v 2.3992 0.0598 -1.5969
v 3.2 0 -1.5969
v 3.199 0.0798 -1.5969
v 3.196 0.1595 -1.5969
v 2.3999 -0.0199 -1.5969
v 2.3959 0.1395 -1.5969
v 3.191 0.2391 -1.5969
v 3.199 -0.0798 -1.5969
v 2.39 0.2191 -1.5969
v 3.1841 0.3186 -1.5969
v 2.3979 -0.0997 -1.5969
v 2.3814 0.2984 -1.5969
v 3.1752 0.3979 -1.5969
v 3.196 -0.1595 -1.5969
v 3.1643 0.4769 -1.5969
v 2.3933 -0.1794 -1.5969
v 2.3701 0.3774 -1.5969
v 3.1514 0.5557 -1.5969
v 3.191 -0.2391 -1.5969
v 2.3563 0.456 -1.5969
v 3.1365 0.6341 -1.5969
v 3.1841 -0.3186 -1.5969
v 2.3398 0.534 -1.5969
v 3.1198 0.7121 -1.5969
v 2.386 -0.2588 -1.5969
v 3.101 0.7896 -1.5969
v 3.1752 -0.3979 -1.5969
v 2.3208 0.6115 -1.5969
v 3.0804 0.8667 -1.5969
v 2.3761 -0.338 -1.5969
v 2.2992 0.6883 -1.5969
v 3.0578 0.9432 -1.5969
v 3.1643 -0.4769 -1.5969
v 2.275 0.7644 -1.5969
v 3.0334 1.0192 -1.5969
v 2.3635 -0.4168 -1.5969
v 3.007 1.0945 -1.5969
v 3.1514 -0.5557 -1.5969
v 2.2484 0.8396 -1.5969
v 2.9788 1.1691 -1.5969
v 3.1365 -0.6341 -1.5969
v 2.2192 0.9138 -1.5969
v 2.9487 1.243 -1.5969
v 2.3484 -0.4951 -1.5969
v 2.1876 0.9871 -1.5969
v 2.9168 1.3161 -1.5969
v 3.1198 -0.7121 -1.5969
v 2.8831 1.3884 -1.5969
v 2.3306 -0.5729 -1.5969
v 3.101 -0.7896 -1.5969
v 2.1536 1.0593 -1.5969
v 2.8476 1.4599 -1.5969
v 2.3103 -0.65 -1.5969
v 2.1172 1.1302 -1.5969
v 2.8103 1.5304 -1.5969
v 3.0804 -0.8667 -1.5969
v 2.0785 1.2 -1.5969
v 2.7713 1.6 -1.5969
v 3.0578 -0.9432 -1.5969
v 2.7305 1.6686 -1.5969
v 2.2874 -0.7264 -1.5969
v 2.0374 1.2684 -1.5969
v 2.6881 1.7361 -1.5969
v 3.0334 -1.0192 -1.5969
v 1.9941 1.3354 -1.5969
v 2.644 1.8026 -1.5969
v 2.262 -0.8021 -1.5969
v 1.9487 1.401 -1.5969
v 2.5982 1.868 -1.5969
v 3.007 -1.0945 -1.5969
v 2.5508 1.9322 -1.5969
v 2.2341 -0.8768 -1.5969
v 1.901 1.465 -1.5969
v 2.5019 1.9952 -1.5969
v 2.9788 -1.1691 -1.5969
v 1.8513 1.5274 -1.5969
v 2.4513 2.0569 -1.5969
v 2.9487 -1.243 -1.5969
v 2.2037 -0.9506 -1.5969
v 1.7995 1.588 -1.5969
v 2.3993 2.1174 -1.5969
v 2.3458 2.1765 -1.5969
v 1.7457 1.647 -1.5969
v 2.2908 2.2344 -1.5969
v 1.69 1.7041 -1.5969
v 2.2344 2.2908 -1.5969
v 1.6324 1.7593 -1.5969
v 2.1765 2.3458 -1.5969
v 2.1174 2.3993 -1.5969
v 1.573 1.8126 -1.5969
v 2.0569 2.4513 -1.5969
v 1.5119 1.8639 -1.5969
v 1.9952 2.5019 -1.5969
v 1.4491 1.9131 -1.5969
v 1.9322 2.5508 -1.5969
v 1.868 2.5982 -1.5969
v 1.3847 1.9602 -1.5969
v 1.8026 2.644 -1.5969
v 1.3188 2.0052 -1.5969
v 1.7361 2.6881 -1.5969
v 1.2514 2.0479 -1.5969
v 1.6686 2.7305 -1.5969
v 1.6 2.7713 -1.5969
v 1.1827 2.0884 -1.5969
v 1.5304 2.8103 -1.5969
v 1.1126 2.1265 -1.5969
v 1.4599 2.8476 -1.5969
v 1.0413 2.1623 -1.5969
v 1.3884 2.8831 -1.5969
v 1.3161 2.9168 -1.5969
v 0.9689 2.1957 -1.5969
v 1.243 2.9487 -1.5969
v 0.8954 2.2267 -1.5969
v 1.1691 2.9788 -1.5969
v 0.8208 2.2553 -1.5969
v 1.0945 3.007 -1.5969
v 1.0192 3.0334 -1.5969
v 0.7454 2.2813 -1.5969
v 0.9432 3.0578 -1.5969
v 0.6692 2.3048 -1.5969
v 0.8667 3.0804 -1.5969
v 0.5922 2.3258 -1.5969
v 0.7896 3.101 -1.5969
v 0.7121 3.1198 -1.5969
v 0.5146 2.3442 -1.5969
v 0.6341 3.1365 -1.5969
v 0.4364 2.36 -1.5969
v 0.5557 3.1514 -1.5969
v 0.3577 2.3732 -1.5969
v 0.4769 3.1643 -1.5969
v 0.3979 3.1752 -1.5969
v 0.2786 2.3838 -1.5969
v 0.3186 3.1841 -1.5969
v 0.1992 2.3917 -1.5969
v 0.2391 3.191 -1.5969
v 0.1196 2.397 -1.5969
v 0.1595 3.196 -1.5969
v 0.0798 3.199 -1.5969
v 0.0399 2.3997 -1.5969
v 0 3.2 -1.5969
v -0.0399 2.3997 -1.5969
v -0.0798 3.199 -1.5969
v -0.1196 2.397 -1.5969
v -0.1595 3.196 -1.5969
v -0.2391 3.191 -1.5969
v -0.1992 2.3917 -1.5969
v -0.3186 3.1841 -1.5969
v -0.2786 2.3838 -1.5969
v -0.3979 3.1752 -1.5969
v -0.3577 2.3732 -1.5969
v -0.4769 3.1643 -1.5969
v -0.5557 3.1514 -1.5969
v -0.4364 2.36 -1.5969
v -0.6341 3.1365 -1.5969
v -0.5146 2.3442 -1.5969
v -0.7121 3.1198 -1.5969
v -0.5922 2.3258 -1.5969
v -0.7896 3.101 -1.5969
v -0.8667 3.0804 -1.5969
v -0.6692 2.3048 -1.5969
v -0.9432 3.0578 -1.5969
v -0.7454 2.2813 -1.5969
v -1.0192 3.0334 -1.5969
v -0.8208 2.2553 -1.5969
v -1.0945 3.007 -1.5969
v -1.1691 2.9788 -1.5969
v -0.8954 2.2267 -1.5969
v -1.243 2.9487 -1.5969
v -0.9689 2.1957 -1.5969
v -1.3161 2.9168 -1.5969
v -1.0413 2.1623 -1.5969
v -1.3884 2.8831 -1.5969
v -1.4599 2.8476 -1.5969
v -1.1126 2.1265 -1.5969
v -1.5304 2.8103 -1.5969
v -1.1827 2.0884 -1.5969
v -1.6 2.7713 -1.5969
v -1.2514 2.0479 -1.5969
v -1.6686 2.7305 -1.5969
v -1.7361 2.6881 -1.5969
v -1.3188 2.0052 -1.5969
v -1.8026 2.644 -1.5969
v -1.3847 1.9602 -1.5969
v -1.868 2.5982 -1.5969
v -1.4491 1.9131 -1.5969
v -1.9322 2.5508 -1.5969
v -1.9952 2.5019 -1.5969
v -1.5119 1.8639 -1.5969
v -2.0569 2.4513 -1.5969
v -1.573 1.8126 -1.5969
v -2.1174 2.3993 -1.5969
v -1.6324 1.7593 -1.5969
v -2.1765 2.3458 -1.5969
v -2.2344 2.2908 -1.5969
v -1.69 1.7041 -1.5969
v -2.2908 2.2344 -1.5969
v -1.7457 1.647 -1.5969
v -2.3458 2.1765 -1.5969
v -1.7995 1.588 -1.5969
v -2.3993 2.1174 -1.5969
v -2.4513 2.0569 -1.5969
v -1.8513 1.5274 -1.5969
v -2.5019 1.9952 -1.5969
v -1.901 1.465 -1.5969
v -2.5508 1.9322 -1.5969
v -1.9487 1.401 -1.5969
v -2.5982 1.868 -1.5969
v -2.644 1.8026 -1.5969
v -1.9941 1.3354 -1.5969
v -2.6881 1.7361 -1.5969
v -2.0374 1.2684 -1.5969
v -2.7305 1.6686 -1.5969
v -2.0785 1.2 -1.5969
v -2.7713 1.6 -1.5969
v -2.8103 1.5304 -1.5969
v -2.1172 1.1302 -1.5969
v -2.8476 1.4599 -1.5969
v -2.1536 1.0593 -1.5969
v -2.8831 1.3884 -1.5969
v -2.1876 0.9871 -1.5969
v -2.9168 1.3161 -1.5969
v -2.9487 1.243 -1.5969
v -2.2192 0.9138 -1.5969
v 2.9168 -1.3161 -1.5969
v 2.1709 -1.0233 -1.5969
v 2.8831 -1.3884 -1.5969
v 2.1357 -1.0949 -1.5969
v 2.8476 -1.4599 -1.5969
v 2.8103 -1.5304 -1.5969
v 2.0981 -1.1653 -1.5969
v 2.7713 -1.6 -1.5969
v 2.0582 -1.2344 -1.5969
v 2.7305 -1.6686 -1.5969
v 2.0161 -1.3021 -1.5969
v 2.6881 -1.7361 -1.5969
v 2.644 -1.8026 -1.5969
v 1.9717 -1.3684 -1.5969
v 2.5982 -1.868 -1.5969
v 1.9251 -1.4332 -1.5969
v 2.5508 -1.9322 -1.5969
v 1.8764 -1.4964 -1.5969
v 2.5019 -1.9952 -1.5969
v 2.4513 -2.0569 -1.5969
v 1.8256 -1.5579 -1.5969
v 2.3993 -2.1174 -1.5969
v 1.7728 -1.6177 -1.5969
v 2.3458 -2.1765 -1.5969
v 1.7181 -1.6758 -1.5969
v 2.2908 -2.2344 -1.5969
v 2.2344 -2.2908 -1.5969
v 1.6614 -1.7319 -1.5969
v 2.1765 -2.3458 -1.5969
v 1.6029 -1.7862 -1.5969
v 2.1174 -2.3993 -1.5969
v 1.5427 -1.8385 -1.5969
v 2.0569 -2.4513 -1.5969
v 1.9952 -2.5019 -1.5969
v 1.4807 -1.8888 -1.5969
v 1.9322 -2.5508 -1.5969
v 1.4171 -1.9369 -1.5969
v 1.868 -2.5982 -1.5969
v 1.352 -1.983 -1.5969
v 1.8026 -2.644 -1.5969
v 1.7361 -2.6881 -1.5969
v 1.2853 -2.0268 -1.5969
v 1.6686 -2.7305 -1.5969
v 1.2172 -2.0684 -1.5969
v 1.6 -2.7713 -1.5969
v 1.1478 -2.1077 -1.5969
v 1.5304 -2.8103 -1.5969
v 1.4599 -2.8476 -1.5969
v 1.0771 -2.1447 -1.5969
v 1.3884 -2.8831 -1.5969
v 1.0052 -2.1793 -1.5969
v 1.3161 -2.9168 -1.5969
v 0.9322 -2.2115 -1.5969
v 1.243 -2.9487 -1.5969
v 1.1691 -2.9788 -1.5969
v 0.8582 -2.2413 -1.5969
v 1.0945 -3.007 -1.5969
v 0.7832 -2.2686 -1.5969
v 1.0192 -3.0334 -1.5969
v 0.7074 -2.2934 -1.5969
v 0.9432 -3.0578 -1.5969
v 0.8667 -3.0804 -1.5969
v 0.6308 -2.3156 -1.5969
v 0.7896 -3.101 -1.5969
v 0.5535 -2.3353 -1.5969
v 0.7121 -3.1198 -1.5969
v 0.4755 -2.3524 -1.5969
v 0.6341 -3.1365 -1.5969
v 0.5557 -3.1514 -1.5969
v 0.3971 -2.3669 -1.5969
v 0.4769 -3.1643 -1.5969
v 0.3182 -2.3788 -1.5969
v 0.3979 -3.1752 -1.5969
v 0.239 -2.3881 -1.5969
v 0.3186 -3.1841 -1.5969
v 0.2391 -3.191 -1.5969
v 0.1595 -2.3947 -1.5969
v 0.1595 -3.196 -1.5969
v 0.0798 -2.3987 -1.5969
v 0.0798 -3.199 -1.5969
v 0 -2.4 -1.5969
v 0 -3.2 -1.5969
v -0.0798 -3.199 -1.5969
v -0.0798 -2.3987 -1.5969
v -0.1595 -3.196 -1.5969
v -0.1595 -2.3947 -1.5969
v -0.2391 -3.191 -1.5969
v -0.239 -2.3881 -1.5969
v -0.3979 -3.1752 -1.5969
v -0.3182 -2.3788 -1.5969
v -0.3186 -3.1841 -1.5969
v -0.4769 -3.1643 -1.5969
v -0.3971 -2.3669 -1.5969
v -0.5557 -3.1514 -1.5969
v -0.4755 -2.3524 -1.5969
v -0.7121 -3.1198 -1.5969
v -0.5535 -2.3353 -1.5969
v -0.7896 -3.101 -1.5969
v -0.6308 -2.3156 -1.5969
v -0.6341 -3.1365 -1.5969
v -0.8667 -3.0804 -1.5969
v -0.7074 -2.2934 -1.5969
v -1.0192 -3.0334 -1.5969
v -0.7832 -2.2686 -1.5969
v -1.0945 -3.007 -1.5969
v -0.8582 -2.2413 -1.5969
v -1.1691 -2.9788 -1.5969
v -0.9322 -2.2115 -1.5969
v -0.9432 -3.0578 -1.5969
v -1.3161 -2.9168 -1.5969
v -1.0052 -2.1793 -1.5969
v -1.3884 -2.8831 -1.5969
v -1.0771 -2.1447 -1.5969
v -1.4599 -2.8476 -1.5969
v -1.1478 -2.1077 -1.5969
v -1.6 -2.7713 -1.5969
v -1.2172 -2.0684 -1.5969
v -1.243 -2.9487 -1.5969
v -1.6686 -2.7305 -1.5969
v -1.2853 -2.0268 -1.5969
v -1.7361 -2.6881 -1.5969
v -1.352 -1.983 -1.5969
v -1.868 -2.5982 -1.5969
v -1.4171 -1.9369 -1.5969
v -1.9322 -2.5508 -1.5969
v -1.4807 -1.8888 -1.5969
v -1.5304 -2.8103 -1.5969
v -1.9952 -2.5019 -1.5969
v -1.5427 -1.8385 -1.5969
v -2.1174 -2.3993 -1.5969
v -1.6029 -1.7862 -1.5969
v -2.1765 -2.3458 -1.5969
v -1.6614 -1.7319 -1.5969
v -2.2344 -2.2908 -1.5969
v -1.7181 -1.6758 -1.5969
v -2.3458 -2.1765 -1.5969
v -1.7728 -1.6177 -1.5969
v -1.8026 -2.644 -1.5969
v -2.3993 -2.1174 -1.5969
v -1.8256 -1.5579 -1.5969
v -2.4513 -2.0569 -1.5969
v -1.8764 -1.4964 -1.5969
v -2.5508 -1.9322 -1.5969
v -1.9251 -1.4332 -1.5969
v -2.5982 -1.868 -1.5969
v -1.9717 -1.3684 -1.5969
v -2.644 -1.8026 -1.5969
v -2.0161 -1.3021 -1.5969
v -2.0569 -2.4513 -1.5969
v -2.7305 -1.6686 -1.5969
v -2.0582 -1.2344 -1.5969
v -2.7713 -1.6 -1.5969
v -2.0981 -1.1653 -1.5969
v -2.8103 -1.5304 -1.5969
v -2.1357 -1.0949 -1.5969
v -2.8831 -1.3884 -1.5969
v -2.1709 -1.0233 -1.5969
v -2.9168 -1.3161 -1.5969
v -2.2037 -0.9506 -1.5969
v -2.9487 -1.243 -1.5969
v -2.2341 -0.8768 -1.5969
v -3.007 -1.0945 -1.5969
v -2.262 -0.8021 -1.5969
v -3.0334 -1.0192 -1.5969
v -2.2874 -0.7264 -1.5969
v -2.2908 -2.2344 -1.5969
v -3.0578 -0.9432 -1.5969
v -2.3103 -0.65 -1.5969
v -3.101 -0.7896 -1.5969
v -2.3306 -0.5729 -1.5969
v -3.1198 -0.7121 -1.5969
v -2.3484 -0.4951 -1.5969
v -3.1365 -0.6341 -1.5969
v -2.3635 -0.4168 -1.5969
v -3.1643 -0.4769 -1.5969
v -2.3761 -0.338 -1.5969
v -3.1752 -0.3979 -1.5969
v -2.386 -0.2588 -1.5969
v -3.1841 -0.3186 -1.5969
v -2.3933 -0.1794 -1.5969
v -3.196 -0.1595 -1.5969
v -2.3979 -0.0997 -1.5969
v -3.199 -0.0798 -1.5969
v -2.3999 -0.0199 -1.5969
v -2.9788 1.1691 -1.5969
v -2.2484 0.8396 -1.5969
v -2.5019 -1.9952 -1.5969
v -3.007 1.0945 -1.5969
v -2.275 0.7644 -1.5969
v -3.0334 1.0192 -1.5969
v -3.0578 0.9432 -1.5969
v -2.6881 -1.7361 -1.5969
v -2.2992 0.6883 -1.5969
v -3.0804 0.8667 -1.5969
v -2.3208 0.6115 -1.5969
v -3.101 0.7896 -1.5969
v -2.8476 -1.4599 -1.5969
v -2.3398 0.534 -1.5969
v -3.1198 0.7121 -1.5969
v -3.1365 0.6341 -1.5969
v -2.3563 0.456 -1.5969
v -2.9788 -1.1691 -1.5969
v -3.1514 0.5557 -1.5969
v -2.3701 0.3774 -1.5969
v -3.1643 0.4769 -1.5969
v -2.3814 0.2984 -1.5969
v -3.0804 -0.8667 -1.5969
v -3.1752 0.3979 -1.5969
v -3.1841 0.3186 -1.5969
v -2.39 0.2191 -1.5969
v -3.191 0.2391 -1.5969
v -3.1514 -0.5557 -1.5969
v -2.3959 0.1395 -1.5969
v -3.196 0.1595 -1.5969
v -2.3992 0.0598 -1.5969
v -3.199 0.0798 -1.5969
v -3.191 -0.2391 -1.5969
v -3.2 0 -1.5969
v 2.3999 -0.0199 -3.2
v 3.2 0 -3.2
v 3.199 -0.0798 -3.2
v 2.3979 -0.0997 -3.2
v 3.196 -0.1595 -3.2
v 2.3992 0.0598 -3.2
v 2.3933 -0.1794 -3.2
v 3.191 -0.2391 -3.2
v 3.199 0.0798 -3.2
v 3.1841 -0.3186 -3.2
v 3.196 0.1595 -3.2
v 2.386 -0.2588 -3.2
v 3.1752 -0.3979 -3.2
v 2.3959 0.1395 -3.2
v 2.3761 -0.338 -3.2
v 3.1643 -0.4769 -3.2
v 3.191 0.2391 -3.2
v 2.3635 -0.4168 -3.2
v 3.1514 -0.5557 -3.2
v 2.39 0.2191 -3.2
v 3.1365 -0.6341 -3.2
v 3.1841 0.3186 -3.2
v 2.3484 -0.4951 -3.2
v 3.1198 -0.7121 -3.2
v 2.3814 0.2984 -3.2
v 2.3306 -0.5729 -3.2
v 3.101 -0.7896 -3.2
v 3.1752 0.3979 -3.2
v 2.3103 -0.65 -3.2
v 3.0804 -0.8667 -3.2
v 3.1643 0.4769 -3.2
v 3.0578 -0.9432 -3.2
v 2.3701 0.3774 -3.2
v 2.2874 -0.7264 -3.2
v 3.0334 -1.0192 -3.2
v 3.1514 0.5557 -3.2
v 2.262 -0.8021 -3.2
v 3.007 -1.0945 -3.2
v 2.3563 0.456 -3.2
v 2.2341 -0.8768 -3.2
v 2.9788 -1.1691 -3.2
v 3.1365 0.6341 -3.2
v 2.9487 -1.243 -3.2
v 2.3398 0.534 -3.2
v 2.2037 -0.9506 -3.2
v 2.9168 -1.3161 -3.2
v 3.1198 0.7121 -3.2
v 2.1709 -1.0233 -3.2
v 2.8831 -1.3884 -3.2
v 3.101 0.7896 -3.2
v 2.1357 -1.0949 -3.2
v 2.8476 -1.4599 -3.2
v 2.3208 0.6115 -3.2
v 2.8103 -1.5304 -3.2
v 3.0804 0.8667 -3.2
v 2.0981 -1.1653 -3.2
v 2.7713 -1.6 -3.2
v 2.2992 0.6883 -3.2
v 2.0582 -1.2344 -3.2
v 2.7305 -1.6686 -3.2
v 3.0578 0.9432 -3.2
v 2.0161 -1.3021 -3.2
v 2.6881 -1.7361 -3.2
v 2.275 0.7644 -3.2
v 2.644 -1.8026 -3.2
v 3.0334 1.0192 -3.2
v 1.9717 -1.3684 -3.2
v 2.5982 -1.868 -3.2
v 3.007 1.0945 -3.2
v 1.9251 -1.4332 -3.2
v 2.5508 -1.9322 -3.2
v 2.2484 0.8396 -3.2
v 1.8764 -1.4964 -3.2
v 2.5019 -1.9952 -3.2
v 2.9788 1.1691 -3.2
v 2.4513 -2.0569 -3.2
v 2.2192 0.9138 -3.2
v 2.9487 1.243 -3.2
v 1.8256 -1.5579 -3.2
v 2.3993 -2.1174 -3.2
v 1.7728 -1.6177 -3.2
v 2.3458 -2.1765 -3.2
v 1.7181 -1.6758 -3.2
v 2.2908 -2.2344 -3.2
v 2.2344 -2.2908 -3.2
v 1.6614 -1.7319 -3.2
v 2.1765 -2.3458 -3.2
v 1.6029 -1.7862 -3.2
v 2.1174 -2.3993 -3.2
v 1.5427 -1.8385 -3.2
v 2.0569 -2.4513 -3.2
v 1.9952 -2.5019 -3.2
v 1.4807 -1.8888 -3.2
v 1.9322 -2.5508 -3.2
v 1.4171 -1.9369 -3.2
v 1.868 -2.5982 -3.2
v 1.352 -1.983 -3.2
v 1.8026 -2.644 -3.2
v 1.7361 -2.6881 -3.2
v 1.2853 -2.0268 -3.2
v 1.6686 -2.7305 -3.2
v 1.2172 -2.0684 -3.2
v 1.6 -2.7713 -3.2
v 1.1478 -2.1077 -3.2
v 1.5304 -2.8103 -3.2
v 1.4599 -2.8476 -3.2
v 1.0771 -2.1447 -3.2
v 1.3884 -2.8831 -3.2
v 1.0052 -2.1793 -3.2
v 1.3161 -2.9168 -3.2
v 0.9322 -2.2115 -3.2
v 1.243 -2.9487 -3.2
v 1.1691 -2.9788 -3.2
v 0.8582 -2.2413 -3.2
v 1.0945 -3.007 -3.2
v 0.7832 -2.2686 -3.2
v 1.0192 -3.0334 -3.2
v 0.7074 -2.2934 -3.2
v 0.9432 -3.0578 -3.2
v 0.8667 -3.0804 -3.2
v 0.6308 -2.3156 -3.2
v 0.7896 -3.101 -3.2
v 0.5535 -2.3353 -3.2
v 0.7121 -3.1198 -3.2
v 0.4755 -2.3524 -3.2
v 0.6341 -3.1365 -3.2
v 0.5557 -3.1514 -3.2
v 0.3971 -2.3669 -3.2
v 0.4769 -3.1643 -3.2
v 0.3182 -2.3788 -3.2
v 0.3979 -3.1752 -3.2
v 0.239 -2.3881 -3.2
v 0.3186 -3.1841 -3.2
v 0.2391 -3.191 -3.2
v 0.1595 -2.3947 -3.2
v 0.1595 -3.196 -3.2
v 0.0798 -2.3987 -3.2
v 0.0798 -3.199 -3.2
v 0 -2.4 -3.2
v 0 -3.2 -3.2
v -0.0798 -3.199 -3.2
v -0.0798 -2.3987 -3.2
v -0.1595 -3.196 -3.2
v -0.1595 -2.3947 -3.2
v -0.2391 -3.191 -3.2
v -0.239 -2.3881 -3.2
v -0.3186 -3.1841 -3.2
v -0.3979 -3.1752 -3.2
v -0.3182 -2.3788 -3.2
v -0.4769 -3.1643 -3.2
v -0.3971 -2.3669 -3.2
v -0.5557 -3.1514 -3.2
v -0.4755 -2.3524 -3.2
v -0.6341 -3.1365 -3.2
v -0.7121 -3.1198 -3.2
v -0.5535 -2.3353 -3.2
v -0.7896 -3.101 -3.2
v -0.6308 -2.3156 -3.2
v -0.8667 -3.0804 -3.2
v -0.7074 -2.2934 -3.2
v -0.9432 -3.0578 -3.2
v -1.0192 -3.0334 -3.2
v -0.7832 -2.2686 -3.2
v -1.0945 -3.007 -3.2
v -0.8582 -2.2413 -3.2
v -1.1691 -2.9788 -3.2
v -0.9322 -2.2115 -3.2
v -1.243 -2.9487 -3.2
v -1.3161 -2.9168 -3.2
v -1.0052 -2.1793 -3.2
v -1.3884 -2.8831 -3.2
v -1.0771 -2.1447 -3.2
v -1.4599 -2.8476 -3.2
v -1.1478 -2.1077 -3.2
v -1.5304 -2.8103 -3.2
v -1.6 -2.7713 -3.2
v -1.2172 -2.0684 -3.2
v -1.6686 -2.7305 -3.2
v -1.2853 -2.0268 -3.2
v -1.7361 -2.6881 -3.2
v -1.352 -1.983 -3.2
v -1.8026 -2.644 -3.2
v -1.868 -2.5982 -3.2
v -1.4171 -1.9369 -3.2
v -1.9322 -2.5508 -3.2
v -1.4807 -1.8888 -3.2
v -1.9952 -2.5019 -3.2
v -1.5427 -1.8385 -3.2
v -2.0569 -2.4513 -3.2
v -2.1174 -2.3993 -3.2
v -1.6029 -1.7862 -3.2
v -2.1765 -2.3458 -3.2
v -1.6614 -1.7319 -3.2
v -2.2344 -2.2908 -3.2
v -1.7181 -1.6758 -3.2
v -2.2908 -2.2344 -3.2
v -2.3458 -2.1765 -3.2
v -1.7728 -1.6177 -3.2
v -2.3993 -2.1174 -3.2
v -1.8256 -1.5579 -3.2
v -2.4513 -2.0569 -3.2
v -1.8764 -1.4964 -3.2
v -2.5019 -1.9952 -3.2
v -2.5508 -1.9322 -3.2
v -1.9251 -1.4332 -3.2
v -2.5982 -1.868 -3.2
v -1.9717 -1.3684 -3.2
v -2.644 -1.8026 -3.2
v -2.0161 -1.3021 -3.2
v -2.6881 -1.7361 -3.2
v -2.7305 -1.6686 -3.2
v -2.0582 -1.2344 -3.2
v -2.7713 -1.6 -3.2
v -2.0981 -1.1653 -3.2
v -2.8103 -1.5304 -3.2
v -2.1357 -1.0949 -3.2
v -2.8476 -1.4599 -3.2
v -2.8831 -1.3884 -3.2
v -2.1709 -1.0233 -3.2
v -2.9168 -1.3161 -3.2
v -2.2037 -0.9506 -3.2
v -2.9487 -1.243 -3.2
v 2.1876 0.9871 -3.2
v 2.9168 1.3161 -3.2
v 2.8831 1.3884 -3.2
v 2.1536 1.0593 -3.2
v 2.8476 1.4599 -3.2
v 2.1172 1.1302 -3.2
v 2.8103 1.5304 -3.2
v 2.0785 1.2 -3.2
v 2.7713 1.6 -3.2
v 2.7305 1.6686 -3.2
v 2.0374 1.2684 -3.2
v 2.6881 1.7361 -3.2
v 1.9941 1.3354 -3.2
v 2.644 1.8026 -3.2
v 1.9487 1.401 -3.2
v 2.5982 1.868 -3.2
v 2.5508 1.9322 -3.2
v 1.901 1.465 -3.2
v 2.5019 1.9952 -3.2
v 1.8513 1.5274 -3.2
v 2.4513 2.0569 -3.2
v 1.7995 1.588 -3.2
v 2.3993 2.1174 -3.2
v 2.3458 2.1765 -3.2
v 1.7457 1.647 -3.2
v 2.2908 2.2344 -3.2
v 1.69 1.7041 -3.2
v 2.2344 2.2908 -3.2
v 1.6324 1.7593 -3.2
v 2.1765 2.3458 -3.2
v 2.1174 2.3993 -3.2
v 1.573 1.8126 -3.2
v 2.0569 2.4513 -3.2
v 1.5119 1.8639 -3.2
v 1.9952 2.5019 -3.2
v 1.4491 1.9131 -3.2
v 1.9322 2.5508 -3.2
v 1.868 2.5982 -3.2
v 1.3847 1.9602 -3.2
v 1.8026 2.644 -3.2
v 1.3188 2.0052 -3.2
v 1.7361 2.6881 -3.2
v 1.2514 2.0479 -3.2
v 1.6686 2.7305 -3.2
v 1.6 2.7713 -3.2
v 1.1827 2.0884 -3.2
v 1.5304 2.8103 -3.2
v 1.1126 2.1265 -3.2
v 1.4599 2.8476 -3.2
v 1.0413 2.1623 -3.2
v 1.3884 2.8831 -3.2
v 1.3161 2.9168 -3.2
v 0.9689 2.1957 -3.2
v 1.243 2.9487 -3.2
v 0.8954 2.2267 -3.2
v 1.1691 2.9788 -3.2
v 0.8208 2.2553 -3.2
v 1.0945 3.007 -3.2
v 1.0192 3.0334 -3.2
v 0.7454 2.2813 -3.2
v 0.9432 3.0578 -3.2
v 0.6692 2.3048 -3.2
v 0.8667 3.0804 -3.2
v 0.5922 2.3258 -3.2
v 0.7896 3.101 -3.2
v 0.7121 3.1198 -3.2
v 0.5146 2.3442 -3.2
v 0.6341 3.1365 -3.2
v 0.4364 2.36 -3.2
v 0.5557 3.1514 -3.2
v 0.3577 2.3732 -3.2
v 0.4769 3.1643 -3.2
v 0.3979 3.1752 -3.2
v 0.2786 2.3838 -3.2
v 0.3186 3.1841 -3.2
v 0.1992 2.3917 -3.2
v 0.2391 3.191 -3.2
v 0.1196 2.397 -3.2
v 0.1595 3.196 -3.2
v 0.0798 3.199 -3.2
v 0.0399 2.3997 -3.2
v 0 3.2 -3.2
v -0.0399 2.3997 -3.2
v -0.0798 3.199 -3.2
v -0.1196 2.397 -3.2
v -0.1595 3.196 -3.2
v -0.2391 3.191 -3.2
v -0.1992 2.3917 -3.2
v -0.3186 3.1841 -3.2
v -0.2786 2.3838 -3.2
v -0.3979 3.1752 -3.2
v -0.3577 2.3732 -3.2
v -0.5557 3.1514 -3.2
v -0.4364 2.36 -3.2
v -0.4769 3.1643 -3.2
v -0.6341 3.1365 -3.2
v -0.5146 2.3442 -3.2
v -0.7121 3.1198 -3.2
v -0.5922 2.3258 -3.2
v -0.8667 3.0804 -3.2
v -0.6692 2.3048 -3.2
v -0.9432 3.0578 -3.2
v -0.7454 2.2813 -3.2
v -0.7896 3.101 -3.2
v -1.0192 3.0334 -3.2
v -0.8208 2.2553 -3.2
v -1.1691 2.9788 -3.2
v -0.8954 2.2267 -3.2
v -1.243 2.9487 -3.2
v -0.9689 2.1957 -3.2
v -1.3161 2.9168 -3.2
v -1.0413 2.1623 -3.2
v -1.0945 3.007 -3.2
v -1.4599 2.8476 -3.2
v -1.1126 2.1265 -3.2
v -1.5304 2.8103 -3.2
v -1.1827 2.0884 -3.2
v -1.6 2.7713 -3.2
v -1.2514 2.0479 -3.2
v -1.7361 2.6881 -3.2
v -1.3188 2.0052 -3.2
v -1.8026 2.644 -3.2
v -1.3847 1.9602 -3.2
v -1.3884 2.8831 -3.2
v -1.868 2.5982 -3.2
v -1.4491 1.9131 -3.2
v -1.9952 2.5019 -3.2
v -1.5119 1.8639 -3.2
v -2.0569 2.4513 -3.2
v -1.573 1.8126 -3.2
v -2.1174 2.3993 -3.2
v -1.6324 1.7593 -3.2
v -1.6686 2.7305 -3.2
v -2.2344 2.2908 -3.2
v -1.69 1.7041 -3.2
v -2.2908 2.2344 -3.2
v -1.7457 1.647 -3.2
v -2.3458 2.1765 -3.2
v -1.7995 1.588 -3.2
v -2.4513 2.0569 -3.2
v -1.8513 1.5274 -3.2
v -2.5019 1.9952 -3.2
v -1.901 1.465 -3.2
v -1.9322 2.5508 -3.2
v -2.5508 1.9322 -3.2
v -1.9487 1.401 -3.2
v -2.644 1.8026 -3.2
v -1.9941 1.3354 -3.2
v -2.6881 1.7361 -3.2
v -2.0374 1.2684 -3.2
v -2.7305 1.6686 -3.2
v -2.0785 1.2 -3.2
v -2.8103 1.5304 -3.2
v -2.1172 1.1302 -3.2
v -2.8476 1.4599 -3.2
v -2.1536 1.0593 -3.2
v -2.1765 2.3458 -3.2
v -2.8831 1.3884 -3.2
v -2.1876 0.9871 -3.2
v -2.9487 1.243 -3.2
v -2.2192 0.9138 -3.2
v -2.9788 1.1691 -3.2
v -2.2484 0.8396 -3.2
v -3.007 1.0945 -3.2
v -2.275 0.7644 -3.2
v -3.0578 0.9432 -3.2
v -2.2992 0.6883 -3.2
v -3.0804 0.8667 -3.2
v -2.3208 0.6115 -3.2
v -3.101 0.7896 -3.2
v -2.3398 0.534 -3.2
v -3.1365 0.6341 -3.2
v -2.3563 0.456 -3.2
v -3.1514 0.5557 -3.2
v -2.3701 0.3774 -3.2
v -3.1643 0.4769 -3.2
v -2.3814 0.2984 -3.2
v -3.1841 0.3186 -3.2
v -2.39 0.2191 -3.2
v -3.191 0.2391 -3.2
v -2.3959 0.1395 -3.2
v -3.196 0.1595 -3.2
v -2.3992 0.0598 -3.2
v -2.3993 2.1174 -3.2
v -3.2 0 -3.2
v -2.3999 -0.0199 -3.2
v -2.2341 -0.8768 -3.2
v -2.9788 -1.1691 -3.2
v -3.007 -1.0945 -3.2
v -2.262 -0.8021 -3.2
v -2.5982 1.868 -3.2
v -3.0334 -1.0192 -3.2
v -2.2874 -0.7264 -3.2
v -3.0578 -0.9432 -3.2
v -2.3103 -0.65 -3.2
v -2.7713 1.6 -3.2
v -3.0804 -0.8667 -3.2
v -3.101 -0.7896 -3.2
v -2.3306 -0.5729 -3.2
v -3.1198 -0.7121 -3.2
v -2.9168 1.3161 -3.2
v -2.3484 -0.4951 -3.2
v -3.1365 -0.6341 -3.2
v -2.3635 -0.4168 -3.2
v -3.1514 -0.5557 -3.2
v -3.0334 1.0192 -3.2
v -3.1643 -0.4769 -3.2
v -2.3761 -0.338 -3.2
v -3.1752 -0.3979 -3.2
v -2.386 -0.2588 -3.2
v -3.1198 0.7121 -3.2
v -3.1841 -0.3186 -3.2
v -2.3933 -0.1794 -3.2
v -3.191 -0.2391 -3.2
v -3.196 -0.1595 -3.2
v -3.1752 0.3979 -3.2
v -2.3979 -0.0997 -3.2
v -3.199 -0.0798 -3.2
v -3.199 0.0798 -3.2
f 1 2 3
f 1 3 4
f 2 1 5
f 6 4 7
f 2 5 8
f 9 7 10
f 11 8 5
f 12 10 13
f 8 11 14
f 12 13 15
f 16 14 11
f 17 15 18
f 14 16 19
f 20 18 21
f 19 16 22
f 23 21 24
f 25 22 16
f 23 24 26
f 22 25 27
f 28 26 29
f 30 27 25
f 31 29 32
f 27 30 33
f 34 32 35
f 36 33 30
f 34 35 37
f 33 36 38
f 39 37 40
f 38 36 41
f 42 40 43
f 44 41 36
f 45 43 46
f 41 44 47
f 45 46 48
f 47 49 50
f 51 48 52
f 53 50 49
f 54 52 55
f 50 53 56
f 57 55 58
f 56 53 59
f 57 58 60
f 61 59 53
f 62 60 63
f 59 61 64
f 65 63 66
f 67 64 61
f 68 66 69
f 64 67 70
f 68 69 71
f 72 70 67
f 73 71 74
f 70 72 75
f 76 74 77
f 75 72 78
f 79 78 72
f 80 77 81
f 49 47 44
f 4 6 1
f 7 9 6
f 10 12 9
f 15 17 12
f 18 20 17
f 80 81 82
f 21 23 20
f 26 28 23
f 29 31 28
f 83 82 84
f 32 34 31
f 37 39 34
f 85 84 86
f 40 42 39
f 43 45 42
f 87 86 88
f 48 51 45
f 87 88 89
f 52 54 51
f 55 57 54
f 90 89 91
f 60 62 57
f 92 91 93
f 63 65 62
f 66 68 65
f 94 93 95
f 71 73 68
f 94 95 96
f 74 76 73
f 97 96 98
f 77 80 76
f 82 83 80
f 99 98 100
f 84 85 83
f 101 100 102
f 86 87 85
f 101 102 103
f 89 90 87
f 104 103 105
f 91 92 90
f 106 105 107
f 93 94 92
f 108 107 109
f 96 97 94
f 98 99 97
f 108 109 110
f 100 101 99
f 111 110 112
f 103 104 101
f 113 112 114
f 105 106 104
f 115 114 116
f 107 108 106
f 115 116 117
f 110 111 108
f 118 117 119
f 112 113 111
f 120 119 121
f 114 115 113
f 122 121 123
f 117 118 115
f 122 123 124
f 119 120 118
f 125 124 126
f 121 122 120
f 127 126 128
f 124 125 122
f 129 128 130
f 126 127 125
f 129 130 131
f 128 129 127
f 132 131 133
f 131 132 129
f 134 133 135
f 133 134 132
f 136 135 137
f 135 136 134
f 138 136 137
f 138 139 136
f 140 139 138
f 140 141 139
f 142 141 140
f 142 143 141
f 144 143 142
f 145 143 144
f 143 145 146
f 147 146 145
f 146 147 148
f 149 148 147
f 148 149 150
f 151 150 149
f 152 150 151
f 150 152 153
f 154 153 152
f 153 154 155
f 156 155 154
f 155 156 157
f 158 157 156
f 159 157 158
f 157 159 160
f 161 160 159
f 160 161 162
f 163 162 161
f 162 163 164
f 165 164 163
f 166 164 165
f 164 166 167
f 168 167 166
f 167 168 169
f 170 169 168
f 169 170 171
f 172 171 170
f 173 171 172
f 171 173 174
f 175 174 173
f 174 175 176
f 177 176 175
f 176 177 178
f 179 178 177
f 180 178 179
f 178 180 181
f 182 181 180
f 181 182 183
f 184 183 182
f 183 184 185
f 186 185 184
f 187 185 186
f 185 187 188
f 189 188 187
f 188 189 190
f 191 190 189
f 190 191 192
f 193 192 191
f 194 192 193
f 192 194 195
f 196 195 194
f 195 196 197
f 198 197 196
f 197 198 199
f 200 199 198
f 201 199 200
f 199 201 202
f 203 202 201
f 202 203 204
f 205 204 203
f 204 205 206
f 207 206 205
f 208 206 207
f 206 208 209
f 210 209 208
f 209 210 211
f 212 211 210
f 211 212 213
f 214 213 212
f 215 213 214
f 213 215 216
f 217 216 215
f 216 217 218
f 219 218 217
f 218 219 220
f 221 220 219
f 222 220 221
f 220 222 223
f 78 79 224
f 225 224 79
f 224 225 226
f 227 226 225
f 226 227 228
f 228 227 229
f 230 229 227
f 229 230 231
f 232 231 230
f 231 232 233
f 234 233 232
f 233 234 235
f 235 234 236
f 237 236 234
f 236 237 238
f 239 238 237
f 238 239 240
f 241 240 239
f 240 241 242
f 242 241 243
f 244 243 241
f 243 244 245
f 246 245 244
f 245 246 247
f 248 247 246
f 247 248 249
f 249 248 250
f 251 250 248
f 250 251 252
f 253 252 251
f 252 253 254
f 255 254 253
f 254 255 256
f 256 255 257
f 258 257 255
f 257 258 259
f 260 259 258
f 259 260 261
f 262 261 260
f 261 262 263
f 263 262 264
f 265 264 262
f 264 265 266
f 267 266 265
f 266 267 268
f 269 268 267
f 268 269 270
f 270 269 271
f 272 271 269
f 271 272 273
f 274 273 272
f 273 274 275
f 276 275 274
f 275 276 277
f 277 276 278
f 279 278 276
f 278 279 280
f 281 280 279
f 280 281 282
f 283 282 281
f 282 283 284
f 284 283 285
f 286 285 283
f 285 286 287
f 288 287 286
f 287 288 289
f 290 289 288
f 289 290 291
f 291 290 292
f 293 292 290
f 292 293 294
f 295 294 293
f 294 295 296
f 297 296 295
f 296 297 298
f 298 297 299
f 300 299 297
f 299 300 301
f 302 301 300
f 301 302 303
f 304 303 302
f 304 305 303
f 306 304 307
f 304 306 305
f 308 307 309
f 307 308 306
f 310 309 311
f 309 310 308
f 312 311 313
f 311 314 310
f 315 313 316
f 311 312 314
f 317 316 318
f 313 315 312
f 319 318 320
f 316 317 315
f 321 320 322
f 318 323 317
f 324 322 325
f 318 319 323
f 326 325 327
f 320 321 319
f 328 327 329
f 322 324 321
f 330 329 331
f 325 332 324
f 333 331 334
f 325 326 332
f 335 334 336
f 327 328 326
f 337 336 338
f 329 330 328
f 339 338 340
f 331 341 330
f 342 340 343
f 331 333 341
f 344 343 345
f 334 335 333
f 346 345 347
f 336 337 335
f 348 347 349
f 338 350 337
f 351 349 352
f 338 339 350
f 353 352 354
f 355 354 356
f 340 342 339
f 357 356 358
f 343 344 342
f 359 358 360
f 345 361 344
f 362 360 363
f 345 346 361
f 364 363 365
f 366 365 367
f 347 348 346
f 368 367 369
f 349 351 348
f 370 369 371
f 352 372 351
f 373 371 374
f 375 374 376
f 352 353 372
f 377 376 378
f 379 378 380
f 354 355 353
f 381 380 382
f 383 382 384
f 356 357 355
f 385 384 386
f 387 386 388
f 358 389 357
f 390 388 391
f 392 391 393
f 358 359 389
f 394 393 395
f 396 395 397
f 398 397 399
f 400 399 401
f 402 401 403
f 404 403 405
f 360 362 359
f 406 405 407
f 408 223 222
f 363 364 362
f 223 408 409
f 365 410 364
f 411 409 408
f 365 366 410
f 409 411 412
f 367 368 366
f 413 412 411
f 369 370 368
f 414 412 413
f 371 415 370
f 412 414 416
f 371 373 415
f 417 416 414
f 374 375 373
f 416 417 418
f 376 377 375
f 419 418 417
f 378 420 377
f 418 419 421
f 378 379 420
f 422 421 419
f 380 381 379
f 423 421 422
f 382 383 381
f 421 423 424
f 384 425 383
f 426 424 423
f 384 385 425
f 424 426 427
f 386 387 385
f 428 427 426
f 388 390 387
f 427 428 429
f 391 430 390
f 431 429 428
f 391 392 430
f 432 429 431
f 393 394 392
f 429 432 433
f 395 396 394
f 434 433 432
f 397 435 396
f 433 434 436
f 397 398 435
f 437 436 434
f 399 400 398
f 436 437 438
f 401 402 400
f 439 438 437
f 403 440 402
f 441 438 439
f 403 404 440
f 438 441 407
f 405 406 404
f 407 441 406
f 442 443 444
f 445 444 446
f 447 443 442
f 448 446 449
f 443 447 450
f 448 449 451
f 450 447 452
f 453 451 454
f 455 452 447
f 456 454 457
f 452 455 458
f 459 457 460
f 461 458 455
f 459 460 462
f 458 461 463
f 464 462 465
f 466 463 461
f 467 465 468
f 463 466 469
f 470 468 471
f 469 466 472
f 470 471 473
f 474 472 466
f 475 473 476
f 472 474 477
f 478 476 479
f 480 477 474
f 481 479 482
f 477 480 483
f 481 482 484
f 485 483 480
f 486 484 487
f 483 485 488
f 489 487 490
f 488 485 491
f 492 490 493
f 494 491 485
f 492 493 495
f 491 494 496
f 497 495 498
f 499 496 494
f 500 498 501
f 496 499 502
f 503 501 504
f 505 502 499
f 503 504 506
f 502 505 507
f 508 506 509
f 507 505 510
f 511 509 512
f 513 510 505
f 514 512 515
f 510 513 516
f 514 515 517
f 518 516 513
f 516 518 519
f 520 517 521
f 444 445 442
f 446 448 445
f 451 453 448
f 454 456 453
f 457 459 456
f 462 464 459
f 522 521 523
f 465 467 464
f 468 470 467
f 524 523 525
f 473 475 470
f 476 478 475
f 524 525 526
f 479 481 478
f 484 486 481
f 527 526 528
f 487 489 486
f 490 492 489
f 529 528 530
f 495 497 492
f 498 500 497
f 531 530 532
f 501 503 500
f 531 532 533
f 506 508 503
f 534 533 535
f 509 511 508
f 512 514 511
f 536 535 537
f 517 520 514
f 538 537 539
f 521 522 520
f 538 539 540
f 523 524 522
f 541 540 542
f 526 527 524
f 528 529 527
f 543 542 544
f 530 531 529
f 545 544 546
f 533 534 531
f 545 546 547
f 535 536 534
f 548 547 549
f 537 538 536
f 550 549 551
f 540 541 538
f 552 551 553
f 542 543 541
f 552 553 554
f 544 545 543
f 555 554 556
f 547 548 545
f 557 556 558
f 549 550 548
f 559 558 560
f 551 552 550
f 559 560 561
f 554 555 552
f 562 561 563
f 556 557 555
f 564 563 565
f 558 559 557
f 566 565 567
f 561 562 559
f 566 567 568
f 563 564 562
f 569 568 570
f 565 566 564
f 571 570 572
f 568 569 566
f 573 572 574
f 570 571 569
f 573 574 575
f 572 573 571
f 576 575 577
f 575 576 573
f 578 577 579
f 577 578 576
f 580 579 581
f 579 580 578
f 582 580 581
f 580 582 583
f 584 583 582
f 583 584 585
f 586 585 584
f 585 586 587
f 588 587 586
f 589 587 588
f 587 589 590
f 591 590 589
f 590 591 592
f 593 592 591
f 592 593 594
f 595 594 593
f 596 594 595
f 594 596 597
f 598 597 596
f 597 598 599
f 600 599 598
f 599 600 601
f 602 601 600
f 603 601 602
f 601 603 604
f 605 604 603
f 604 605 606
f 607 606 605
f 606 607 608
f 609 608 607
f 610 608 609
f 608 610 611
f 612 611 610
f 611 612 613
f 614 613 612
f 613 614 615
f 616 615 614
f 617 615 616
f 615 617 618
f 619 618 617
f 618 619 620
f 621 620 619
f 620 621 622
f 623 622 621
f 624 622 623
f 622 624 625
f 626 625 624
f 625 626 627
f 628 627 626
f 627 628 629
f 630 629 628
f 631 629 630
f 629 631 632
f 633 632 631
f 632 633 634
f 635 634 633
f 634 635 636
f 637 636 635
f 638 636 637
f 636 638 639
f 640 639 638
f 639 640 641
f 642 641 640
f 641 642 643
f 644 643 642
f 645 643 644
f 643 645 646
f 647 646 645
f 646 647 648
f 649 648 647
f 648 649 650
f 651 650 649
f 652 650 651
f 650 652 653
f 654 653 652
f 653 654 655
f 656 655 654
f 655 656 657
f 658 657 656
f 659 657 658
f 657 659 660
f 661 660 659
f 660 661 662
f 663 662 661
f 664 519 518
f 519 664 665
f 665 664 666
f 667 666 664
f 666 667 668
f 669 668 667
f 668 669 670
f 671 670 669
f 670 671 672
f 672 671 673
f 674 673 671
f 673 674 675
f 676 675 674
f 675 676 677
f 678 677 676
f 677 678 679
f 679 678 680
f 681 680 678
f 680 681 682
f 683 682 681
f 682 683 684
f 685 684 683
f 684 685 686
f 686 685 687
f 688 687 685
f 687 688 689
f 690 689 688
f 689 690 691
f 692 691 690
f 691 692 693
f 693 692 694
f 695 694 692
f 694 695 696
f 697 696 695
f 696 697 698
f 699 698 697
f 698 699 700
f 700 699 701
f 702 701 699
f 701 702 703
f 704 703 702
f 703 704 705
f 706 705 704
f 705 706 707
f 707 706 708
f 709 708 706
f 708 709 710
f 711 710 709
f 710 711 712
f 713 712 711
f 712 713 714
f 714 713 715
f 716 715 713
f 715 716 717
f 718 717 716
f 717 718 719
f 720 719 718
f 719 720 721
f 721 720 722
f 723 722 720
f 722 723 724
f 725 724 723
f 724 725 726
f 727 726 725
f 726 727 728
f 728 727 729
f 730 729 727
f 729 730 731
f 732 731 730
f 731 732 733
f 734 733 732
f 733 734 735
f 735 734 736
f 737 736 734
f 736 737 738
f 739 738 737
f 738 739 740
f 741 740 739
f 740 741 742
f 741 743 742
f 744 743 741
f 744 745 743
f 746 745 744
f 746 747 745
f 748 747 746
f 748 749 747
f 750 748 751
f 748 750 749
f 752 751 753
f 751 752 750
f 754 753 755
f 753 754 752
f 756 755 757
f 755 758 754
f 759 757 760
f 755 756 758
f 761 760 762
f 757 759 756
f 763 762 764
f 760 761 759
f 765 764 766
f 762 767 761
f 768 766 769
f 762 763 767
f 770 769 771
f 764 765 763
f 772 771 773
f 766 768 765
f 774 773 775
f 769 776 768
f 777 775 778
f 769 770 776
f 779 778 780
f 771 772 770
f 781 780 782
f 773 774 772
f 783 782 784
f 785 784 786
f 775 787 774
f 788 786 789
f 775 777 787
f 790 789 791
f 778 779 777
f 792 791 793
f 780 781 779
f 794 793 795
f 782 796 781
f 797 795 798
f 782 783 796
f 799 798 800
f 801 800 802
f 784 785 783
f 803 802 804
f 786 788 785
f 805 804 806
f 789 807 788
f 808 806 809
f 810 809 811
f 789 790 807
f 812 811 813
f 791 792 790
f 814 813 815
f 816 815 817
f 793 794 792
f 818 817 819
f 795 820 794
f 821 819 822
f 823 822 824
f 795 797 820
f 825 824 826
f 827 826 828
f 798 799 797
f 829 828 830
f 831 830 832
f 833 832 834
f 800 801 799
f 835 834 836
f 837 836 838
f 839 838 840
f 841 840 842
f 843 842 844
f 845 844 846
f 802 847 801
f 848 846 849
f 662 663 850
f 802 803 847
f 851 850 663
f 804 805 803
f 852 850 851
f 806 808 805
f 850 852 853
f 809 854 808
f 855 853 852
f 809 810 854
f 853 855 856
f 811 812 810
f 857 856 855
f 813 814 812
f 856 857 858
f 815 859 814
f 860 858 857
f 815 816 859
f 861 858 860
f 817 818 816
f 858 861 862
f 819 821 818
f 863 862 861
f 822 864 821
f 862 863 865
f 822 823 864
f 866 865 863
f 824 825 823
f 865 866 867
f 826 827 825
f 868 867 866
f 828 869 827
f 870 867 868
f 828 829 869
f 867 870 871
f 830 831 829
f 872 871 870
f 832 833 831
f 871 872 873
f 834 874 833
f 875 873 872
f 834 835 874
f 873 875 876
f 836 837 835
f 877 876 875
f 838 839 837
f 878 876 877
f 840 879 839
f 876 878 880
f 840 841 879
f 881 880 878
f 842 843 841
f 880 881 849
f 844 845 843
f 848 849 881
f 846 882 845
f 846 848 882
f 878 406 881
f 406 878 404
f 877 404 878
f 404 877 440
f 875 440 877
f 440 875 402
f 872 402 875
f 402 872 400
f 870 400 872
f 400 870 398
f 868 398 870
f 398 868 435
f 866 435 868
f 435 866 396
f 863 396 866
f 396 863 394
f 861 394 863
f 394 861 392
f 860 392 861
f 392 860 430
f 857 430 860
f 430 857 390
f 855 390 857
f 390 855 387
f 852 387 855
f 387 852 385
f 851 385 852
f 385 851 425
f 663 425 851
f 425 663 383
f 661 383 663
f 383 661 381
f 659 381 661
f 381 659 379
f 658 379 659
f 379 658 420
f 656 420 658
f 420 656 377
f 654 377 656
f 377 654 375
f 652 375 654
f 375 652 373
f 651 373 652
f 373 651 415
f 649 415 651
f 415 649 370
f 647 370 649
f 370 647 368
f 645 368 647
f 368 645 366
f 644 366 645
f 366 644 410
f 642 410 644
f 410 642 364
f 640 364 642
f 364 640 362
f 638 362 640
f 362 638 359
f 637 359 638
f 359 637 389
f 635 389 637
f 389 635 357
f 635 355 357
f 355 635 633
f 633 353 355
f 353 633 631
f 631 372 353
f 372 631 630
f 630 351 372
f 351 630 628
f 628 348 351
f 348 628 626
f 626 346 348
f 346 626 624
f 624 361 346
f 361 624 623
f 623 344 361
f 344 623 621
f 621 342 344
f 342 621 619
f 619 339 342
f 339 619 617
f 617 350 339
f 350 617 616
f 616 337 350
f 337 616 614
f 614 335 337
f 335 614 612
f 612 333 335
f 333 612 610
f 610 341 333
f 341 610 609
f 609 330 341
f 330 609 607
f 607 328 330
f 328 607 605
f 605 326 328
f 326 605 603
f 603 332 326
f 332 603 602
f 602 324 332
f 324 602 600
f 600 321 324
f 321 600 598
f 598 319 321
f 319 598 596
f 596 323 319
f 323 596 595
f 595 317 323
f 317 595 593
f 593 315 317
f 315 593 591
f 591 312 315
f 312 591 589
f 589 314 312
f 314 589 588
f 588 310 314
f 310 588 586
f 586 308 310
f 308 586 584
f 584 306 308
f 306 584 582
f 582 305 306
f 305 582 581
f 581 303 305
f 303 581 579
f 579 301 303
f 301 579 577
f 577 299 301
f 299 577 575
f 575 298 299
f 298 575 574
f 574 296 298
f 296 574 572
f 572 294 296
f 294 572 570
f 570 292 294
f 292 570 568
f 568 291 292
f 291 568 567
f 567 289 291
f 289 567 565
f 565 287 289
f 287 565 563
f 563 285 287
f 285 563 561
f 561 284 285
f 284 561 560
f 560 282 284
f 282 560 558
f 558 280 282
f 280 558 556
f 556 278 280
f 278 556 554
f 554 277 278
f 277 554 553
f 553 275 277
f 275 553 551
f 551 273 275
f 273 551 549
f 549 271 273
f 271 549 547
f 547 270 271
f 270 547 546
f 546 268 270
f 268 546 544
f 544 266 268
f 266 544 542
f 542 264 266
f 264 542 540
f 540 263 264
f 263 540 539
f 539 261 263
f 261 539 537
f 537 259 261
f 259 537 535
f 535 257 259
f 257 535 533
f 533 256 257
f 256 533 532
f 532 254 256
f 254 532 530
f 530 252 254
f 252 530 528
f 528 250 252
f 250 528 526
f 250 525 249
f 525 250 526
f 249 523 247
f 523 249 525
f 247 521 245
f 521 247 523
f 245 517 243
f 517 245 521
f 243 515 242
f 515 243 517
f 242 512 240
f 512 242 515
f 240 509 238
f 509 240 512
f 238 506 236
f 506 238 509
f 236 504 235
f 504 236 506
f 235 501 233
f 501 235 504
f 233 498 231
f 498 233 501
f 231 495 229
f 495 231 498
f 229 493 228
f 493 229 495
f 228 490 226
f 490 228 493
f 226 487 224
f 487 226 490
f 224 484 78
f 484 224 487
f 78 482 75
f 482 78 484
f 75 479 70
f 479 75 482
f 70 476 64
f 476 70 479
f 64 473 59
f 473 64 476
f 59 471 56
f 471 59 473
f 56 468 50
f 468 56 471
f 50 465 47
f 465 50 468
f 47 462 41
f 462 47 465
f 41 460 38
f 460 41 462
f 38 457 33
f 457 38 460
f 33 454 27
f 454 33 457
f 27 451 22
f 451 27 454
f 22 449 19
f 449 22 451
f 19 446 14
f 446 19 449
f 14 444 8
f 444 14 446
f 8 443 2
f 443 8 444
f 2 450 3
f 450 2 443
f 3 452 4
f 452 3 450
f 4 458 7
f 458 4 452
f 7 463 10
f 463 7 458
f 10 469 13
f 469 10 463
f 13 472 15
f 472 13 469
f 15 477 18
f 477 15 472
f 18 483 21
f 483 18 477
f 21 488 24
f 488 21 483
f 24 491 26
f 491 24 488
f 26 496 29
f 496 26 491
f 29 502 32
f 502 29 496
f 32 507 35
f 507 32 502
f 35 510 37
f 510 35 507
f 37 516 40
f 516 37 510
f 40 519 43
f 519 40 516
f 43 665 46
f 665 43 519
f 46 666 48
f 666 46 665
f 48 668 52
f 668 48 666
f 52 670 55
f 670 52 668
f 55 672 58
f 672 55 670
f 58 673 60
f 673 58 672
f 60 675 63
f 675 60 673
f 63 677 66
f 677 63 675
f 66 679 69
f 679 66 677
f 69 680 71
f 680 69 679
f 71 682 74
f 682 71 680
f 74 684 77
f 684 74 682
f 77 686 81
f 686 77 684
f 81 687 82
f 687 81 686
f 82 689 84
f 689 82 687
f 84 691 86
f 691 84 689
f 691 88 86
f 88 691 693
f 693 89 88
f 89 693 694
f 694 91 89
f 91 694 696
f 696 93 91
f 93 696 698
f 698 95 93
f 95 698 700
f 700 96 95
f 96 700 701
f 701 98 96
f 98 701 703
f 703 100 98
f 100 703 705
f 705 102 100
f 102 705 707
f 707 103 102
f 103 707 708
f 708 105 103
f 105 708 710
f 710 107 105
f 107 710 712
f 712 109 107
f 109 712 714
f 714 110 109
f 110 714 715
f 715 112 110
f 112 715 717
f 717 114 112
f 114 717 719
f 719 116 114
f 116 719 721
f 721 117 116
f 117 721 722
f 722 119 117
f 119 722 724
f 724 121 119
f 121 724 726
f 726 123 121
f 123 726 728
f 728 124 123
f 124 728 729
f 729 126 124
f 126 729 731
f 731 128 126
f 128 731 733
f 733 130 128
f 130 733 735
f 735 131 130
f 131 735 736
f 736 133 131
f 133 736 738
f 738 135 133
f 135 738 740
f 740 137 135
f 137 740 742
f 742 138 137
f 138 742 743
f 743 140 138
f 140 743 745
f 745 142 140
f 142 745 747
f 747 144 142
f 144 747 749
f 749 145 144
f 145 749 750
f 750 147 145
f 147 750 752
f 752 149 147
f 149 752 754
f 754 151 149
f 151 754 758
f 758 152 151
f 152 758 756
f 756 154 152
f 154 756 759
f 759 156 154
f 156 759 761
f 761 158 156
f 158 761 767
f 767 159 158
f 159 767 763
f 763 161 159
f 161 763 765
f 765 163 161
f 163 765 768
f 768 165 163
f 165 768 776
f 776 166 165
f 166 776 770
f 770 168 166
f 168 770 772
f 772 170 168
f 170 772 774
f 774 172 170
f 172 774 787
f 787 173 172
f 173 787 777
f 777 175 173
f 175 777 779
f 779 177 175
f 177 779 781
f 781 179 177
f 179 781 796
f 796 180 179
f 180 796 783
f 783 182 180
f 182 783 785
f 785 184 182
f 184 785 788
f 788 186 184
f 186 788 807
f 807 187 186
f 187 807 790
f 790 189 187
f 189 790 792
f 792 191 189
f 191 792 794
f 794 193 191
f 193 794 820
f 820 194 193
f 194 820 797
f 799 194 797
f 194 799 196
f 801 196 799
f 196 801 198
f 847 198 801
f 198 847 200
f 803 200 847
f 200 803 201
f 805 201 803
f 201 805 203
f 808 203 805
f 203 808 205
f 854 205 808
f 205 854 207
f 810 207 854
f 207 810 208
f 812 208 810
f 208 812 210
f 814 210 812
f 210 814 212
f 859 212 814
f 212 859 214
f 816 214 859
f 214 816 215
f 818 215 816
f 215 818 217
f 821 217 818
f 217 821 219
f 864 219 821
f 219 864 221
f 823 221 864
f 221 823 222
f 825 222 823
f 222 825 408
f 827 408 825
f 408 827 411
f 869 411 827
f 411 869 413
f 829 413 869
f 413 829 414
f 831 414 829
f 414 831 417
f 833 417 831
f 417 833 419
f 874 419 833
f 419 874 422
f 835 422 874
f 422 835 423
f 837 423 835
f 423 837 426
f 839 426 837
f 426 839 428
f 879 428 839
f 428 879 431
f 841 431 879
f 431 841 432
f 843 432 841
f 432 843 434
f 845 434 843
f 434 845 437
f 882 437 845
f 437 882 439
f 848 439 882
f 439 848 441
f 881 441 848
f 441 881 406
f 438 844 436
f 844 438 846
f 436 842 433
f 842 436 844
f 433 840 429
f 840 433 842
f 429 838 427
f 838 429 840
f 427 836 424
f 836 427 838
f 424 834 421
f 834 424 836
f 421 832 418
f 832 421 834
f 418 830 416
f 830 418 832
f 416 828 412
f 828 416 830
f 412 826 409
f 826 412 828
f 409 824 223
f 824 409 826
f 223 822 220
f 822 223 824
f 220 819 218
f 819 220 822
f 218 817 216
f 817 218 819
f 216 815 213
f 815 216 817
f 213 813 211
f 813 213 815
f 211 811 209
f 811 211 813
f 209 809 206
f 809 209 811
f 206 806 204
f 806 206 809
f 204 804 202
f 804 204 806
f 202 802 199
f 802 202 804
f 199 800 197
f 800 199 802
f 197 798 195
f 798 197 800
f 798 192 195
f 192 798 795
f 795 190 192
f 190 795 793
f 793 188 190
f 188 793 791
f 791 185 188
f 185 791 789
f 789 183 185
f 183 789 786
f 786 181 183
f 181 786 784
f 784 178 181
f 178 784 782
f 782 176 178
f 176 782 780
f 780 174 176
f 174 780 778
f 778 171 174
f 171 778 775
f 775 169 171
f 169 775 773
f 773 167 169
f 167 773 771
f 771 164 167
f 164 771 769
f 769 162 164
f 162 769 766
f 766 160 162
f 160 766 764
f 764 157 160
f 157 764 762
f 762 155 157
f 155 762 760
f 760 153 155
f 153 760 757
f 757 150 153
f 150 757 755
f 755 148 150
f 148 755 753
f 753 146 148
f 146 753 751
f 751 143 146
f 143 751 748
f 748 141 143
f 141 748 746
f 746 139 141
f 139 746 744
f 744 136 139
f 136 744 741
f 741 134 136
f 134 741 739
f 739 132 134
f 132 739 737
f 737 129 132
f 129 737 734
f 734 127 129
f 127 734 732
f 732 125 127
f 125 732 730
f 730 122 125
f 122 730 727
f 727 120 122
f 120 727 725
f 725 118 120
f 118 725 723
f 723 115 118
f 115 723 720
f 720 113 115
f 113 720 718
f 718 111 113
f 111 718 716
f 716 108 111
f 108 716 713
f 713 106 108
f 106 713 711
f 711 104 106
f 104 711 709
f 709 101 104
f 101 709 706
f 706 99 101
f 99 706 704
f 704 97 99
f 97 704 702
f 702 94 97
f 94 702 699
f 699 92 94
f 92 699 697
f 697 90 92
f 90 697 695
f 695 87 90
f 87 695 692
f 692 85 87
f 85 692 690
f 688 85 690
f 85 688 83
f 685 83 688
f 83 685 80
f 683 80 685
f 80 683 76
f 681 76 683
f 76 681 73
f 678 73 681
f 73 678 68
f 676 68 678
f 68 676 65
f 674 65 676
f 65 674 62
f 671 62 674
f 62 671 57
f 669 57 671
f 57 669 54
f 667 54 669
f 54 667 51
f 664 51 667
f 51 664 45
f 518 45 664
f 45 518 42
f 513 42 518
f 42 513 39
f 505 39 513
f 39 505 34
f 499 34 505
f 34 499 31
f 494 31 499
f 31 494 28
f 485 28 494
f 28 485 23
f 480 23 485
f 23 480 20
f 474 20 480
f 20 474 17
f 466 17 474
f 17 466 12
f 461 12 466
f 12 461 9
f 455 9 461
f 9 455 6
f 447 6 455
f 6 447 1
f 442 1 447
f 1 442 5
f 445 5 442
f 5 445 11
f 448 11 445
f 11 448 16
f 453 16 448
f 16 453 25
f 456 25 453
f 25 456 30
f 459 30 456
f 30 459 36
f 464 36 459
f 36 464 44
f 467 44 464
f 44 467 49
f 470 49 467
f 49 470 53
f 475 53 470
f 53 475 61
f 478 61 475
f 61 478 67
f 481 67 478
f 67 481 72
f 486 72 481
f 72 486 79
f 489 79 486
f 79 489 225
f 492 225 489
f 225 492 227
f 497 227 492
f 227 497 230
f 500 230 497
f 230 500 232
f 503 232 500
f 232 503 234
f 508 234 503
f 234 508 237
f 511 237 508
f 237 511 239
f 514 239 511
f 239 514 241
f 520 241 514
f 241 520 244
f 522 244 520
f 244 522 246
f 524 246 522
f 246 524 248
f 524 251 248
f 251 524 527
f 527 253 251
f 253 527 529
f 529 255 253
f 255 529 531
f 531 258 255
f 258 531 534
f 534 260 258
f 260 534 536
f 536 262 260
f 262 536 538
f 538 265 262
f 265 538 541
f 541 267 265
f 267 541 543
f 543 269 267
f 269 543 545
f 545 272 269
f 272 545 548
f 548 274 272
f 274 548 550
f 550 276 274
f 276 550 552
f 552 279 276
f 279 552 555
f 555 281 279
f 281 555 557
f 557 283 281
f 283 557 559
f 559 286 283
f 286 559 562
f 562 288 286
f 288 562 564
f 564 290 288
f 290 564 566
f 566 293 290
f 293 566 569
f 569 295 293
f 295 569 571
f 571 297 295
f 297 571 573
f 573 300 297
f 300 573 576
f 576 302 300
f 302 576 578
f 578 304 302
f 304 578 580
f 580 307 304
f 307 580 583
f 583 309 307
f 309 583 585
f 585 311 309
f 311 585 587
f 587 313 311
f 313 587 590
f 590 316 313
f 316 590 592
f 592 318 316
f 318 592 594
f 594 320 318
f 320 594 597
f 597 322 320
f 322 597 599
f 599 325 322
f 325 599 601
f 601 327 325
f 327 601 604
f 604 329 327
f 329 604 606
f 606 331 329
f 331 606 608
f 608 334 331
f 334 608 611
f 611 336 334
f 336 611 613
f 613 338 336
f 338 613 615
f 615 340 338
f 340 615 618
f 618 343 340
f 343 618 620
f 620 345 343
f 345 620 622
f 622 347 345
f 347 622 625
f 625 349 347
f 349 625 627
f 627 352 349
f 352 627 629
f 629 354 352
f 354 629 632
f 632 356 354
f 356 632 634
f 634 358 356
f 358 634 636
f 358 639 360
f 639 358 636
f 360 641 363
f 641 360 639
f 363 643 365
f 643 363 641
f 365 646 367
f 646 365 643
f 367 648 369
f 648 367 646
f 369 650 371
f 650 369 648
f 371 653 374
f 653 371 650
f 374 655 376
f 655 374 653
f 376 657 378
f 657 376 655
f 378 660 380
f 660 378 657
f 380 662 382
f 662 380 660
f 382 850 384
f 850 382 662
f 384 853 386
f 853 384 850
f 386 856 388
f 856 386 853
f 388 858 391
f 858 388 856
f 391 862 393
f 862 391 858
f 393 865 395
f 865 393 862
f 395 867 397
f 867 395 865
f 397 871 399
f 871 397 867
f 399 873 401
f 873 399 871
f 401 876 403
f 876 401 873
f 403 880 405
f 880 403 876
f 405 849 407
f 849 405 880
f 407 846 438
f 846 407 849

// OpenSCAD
use <../lib.scad>
use <14769.scad>
use <6258203m.scad>
$fa=1; $fs=0.2;
function ldraw_lib__14769d01(realsolid=false) = [
// 0 Tile  2 x  2 Round with Round Underside Stud with Gas Cap and Classic "GT" Emblem Sticker
// 0 Name: 14769d01.dat
// 0 Author: Ulrich Röder [UR]
// 0 !LDRAW_ORG Shortcut UPDATE 2019-01
// 0 !LICENSE Licensed under CC BY 2.0 and CC BY 4.0 : see CAreadme.txt
// 
// 0 BFC CERTIFY CCW
  [0,"BFC","CERTIFY"],
  [0,"BFC","CCW"],
// 
// 0 !KEYWORDS Car, Ford, Mustang, Set 10265
// 
// 0 !CMDLINE -c135
// 
// 0 !HISTORY 2019-06-28 [PTadmin] Official Update 2019-01
// 
// 
// 1 16 0 0 0 1 0 0 0 1 0 0 0 1 14769.dat
  [1,16,0,0,0,1,0,0,0,1,0,0,0,1, ldraw_lib__14769(realsolid)],
// 1 16 0 0 0 1 0 0 0 1 0 0 0 1 6258203m.dat
  [1,16,0,0,0,1,0,0,0,1,0,0,0,1, ldraw_lib__6258203m(realsolid)],
];
module ldraw_lib__14769d01(step=0, col=false, unit=2/5, alt=false, line=0.2, solid=!$preview)
    makepoly(ldraw_lib__14769d01(solid), step=step, col=col, unit=unit, alt=alt, line=line, solid=solid);
ldraw_lib__14769d01(line=0.2);
